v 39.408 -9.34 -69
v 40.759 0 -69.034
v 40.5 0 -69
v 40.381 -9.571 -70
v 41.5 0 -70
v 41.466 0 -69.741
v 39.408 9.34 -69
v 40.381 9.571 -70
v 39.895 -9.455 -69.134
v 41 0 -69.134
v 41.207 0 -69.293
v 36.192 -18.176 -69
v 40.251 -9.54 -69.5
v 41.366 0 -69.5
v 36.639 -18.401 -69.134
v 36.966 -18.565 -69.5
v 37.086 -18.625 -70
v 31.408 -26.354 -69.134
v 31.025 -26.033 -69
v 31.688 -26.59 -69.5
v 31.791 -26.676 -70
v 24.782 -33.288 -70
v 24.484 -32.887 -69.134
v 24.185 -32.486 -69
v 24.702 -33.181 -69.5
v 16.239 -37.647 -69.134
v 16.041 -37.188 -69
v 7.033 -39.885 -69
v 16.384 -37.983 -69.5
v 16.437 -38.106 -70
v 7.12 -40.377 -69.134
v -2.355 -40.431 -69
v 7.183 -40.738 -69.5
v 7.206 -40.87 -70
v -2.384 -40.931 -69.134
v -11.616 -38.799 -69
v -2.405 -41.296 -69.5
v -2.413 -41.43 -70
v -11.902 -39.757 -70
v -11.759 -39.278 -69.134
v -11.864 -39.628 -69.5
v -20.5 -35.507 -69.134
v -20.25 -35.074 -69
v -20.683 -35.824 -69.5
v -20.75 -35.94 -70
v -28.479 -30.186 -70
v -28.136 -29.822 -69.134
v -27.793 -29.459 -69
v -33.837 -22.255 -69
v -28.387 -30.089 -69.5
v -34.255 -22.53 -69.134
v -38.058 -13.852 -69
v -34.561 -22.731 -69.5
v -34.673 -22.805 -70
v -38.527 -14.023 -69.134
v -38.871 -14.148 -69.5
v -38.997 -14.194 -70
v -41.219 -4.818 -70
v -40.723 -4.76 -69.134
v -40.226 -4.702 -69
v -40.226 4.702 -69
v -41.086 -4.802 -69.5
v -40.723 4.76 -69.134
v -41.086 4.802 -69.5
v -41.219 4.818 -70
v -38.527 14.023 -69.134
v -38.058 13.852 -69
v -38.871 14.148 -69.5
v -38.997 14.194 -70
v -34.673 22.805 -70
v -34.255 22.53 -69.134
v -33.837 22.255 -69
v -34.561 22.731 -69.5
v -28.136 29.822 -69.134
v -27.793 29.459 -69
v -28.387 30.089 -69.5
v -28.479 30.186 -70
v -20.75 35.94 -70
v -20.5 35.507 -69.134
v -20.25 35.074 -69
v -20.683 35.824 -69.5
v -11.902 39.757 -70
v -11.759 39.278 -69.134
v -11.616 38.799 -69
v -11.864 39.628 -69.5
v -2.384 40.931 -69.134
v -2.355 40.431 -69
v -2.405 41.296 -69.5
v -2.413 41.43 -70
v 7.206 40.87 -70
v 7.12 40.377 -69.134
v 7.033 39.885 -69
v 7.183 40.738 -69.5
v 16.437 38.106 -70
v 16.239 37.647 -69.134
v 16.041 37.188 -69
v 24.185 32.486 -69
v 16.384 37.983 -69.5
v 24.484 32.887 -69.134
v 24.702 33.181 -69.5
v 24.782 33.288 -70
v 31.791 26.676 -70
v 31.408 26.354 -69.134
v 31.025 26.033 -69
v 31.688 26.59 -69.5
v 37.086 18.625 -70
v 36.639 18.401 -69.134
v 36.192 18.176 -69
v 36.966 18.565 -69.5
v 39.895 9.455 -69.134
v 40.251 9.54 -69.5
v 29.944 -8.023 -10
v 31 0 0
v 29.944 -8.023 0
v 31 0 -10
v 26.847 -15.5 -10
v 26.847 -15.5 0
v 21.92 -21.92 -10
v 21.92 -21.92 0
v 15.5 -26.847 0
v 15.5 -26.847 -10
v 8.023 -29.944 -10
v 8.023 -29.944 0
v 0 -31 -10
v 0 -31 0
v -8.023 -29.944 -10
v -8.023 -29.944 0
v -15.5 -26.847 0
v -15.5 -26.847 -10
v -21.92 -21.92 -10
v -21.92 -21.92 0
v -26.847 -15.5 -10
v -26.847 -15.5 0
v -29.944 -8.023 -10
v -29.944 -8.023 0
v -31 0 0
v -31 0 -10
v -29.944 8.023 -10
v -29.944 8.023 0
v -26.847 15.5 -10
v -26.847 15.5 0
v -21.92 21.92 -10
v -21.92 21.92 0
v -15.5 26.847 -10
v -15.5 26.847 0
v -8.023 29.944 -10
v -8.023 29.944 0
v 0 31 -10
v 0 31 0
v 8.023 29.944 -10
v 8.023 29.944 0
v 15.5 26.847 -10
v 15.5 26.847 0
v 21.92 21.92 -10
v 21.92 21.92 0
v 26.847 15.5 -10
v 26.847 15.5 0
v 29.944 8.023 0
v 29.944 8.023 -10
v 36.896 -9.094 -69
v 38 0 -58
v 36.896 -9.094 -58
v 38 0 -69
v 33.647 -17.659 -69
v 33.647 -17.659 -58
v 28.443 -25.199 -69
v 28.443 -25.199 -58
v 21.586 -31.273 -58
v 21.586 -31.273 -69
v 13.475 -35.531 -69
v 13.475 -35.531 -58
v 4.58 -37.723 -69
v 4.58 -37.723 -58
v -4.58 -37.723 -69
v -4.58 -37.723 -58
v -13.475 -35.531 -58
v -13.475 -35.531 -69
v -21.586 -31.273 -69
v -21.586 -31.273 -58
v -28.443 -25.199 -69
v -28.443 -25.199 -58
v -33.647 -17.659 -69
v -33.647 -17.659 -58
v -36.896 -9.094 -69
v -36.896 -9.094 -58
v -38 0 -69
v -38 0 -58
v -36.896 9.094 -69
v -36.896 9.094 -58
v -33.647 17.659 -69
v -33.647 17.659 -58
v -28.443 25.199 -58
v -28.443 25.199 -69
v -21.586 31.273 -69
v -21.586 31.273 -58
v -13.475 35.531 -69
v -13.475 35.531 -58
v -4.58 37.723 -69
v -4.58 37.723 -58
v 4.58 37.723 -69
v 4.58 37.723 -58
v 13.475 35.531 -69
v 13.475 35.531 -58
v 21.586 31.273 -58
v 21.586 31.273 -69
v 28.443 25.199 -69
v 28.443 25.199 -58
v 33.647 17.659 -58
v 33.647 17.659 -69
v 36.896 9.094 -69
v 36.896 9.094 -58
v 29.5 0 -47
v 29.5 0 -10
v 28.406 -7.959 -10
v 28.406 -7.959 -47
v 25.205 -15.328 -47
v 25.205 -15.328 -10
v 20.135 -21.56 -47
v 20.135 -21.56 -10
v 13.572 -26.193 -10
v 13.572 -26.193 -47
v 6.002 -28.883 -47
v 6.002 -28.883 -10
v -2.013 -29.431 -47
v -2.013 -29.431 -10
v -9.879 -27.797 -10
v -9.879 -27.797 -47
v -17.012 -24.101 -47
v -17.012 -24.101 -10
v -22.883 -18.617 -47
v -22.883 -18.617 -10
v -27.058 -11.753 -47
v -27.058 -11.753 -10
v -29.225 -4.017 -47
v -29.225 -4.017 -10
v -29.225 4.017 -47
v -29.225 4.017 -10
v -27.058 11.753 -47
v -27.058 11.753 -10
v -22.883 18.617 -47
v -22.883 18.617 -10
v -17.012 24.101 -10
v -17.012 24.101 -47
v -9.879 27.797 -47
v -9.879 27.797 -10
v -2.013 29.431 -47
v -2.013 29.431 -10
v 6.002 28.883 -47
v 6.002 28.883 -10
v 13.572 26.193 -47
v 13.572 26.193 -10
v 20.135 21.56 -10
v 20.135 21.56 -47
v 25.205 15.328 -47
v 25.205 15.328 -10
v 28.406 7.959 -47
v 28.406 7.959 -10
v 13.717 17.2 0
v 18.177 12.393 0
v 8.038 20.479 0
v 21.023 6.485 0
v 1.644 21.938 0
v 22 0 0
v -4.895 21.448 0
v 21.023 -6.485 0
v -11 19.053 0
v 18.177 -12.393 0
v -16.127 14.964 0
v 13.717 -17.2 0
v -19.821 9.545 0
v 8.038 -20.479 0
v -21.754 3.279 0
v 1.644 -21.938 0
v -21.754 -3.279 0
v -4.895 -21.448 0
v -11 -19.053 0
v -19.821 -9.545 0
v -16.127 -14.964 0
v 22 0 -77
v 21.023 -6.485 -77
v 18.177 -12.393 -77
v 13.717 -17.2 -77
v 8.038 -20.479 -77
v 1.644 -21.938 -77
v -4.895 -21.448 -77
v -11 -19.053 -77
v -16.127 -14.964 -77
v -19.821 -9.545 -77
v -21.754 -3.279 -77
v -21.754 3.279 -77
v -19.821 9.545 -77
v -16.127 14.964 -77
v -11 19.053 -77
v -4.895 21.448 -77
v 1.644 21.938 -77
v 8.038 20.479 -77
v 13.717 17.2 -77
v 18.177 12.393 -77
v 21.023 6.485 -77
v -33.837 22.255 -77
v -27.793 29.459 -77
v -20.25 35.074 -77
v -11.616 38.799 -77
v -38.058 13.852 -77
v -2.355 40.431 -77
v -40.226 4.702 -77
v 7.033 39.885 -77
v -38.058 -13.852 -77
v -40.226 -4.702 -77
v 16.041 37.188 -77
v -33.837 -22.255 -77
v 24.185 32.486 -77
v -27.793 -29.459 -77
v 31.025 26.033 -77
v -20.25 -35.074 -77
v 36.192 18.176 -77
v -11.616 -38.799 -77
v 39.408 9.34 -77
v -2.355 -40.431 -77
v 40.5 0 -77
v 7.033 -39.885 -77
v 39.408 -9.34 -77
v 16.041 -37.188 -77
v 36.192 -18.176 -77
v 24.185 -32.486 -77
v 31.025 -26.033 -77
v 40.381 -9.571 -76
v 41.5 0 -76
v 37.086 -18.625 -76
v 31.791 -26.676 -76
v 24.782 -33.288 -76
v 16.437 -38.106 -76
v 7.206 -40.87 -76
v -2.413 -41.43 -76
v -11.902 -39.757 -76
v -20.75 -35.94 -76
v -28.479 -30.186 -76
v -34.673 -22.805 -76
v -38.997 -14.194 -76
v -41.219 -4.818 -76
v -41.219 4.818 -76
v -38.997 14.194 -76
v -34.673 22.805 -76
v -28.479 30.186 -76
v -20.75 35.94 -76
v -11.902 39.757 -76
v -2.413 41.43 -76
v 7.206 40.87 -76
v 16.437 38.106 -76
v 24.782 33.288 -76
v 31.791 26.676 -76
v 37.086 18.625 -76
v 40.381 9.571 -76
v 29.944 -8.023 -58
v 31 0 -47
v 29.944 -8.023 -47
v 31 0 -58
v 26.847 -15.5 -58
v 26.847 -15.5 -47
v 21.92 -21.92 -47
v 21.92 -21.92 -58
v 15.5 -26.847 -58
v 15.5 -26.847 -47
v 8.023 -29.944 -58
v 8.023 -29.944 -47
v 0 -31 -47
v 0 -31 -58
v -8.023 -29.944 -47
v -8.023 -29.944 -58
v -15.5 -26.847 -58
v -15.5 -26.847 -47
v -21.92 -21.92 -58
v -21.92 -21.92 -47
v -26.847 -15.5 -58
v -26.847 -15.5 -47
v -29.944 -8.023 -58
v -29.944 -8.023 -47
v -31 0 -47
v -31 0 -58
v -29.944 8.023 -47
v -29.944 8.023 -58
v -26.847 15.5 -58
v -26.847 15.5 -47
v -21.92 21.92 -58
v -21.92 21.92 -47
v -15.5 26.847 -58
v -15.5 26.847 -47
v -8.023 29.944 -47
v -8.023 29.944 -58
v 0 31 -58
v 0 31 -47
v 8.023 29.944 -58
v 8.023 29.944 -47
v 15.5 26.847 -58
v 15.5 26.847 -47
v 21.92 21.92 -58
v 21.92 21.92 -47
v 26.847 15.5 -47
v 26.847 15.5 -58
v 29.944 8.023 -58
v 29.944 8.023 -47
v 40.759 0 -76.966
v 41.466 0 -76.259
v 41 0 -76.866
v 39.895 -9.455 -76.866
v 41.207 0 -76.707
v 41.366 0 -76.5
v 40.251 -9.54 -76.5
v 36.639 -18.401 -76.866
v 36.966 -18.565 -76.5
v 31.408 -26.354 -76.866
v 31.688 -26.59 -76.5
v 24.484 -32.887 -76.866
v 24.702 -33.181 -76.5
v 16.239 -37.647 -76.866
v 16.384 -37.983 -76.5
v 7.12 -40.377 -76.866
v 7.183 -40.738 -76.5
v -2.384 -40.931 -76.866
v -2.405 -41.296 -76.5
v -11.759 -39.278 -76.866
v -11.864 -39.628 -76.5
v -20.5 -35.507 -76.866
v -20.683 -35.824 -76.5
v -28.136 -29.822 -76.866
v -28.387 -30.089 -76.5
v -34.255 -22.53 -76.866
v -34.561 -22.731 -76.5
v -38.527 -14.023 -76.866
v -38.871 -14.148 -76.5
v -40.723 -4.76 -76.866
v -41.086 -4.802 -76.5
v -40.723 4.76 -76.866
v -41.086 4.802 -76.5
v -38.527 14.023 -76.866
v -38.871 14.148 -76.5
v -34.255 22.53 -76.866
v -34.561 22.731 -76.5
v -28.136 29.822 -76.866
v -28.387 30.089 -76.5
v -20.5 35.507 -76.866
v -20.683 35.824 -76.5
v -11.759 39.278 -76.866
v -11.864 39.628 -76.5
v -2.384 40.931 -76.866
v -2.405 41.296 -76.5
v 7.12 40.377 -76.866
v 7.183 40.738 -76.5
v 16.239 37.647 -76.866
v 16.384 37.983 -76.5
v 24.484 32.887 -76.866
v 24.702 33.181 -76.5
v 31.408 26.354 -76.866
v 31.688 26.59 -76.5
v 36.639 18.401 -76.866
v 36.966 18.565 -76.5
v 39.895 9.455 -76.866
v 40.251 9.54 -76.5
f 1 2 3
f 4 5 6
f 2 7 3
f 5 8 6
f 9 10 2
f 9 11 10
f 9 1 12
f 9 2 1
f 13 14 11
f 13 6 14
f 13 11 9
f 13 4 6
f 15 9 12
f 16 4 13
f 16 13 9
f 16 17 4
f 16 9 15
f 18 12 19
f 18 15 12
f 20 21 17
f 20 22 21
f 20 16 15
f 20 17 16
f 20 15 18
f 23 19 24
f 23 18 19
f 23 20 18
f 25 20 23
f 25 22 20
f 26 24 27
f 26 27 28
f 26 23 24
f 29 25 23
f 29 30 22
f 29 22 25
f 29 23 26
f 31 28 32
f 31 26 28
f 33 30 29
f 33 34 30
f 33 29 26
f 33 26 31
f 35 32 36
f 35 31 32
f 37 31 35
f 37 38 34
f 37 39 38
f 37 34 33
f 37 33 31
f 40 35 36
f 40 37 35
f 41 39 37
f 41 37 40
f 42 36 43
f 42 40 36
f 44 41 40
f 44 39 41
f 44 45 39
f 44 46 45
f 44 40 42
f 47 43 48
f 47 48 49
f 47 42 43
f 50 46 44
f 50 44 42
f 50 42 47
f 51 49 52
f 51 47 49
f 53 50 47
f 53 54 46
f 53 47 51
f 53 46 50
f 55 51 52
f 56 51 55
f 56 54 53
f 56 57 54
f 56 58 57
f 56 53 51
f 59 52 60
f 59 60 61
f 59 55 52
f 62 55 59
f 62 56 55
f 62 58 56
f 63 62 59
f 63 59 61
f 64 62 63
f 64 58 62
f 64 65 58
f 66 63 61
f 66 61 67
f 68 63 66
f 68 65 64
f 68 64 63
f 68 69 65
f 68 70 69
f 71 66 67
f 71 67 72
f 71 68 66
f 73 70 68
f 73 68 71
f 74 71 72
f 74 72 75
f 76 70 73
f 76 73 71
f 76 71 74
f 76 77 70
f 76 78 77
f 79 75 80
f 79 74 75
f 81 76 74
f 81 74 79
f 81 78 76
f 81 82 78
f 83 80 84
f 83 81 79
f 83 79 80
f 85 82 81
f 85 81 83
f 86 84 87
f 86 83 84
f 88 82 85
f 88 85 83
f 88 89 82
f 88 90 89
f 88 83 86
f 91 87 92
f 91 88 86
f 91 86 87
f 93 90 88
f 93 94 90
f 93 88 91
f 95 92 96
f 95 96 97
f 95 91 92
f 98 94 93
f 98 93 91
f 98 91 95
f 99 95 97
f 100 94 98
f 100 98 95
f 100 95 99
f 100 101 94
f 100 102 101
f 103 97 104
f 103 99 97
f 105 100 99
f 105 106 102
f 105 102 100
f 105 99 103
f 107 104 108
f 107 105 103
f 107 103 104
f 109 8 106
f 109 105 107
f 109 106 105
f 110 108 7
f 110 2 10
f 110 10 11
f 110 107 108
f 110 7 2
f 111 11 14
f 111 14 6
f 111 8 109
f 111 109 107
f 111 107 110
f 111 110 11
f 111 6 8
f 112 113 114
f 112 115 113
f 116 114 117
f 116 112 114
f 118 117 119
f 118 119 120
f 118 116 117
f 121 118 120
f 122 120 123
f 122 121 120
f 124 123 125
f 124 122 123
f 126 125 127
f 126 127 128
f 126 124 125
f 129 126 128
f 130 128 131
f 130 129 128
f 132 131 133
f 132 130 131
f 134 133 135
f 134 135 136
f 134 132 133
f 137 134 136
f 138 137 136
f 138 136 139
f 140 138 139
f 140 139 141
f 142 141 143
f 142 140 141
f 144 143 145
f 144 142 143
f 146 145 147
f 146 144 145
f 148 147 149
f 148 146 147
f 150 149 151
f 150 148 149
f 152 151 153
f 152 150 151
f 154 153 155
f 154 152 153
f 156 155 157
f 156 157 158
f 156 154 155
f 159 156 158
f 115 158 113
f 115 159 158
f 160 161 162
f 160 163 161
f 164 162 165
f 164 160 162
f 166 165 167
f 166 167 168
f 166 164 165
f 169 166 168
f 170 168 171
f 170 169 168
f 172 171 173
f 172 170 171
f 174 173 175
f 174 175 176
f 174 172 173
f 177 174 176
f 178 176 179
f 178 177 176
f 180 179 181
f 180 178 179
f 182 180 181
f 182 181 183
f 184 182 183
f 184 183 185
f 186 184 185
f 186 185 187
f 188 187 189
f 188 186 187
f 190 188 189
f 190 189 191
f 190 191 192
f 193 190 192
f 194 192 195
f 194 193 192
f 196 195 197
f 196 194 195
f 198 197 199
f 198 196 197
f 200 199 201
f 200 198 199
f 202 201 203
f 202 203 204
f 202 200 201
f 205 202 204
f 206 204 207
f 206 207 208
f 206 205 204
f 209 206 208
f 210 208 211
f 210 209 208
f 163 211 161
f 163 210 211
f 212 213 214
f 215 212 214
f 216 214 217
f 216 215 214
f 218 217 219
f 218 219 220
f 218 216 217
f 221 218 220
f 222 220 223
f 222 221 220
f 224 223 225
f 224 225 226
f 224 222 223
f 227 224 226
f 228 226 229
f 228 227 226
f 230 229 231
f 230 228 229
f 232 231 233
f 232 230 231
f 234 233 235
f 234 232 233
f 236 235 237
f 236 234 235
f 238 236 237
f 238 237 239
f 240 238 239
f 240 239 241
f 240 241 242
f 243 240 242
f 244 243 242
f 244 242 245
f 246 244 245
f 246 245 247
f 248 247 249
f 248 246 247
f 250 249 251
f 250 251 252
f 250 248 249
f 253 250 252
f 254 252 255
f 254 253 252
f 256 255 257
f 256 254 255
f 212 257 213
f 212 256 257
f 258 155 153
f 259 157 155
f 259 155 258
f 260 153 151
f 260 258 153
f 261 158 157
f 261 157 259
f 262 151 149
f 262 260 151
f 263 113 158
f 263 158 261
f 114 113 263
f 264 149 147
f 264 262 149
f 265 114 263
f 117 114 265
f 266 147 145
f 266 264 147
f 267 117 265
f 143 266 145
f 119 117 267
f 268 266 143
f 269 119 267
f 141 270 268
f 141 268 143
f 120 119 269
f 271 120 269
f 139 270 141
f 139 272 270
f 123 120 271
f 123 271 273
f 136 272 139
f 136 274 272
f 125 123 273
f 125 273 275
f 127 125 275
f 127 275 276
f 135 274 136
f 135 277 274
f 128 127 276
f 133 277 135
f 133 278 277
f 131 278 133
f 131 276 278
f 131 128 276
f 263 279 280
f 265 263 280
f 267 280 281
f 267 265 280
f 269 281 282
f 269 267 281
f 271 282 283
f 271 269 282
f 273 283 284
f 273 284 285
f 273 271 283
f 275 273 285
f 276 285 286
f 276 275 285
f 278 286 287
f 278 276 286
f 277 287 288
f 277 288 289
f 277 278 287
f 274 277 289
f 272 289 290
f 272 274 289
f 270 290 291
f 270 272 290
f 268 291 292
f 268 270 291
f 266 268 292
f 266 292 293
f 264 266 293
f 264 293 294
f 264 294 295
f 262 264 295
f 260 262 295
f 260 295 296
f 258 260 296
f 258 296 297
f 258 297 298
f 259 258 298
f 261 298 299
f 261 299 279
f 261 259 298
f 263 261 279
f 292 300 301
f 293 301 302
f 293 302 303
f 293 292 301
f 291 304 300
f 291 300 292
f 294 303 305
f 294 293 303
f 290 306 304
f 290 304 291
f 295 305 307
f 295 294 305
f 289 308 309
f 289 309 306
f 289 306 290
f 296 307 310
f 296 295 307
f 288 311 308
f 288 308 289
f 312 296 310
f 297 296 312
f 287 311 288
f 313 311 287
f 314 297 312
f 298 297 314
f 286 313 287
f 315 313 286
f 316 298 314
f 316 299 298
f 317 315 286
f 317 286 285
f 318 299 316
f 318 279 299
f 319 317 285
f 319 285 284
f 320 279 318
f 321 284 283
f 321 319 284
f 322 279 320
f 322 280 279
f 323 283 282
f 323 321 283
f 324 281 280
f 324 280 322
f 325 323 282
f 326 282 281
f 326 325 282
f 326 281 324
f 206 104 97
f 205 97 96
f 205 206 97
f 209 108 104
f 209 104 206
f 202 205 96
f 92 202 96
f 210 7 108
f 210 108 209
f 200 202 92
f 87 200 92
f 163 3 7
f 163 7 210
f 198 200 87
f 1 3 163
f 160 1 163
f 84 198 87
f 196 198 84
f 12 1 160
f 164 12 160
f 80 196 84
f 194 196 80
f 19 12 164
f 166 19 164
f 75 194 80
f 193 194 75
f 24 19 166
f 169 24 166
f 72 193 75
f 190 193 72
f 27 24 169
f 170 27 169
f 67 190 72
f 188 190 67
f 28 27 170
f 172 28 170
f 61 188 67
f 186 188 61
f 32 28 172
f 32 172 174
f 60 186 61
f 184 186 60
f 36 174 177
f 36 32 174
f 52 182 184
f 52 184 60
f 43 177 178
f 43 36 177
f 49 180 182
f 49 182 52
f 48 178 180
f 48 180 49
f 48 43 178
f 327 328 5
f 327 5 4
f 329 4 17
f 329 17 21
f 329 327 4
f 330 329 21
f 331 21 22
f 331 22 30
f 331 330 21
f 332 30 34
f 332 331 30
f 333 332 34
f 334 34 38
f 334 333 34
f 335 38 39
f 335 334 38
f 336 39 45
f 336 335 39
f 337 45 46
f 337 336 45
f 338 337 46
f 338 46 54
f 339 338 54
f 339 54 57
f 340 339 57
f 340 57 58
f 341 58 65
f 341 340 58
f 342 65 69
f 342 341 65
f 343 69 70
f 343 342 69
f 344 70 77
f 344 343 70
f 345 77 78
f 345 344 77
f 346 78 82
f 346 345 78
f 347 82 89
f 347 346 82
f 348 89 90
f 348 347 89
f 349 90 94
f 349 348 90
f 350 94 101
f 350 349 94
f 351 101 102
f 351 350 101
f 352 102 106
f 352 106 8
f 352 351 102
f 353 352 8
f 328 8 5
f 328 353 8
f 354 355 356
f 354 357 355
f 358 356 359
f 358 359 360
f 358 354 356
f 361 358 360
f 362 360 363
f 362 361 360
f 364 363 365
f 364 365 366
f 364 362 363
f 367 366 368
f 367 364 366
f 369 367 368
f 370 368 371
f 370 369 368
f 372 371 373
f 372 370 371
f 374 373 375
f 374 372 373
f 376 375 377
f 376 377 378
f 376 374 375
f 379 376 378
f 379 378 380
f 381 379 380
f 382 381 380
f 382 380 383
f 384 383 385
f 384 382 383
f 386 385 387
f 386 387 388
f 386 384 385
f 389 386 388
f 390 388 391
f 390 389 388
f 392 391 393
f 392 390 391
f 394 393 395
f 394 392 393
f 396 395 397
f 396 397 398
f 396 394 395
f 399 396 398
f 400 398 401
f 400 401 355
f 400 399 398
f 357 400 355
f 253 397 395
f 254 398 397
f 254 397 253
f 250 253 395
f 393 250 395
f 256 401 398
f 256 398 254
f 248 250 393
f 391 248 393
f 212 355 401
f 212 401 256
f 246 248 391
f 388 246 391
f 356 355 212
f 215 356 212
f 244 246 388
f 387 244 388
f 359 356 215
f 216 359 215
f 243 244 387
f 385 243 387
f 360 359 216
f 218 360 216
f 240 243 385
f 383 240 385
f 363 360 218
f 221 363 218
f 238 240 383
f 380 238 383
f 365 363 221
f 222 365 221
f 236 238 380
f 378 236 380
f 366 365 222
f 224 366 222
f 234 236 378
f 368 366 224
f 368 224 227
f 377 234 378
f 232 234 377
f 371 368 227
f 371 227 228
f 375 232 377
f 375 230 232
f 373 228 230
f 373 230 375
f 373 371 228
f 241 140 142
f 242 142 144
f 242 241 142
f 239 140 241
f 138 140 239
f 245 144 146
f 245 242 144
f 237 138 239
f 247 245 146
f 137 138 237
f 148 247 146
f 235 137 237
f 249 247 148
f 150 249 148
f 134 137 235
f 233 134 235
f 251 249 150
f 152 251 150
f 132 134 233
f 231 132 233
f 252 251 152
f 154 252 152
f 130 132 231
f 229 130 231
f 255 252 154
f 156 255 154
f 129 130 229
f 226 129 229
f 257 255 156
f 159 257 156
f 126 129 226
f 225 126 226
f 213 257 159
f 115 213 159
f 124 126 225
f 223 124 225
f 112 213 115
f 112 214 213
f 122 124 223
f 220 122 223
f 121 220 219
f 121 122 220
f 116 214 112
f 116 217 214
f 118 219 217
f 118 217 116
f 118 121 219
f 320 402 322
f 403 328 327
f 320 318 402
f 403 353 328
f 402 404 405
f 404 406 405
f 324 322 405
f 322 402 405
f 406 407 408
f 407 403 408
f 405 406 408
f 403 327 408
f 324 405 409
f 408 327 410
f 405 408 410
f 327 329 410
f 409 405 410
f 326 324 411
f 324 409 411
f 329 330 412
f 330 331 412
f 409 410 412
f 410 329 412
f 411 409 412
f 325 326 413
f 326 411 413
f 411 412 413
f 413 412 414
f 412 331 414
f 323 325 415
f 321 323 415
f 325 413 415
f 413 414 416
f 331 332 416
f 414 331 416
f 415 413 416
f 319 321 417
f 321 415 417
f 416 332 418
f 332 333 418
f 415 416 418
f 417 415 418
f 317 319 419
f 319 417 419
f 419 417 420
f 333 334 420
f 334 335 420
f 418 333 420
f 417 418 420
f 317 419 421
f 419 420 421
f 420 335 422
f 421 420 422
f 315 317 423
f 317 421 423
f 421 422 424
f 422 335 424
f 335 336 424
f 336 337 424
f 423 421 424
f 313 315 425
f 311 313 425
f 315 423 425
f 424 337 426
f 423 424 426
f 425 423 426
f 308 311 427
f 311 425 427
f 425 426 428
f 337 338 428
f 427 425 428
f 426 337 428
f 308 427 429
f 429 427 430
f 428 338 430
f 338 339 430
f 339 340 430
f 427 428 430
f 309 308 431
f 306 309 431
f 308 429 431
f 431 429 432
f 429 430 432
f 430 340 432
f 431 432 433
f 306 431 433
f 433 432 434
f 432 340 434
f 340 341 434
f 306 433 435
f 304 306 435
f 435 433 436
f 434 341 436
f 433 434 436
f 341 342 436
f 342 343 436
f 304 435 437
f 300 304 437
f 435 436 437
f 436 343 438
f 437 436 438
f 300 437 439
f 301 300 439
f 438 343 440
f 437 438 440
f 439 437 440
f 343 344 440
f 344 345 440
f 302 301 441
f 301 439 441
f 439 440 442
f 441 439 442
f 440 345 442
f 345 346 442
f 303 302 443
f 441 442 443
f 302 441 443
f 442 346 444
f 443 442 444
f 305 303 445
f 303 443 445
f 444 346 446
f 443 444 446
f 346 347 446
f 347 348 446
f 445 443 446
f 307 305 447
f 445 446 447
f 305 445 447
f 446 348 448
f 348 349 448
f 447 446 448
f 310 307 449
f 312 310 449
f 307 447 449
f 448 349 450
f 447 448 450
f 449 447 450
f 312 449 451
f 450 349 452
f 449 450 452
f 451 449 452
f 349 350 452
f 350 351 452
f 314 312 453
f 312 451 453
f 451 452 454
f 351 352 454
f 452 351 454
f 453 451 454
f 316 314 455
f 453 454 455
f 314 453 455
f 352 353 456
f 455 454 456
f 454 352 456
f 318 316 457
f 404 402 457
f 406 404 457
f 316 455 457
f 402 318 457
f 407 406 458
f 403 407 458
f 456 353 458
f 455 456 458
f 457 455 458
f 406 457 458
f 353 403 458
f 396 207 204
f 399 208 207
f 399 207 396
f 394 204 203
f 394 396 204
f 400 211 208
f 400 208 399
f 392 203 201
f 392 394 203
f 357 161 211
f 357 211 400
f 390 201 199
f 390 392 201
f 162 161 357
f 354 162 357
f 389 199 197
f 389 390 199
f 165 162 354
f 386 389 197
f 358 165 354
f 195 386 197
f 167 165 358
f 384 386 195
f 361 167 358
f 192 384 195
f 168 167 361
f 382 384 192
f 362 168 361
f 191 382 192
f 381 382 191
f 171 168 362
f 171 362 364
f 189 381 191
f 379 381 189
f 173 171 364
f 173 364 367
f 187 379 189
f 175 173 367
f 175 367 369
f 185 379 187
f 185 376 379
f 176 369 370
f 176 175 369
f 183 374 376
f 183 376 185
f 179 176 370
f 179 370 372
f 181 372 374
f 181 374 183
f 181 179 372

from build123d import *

# Parameters (mm, degrees)
FILLET2_R = 1


with BuildPart() as part:
    # Sketch1 → Revolve1 (revolve)
    with BuildSketch(Plane(origin=(0, 0, 0), x_dir=(1, 0, 0), z_dir=(0, 1, 0)), mode=Mode.PRIVATE) as revolve1_sk:
        Polygon((-41.5, 77), (-22, 77), (-22, 0), (-31, 0), (-31, 10), (-29.5, 10), (-29.5, 47), (-31, 47), (-31, 58), (-38, 58), (-38, 69), (-41.5, 69), align=None)
    revolve(revolve1_sk.sketch.rotate(Axis((0, 0, 0), (0, 0, -1)), 180), axis=Axis((0, 0, 0), (0, 0, -1)))  # turned: the seam where the file's is

    # Fillet2
    fillet2_edges = [part.edges().sort_by_distance(p)[0] for p in [
        (-41.5, 0, -77),
        (-41.5, 0, -69),
    ]]
    fillet(fillet2_edges, radius=FILLET2_R)


solid = part.part
